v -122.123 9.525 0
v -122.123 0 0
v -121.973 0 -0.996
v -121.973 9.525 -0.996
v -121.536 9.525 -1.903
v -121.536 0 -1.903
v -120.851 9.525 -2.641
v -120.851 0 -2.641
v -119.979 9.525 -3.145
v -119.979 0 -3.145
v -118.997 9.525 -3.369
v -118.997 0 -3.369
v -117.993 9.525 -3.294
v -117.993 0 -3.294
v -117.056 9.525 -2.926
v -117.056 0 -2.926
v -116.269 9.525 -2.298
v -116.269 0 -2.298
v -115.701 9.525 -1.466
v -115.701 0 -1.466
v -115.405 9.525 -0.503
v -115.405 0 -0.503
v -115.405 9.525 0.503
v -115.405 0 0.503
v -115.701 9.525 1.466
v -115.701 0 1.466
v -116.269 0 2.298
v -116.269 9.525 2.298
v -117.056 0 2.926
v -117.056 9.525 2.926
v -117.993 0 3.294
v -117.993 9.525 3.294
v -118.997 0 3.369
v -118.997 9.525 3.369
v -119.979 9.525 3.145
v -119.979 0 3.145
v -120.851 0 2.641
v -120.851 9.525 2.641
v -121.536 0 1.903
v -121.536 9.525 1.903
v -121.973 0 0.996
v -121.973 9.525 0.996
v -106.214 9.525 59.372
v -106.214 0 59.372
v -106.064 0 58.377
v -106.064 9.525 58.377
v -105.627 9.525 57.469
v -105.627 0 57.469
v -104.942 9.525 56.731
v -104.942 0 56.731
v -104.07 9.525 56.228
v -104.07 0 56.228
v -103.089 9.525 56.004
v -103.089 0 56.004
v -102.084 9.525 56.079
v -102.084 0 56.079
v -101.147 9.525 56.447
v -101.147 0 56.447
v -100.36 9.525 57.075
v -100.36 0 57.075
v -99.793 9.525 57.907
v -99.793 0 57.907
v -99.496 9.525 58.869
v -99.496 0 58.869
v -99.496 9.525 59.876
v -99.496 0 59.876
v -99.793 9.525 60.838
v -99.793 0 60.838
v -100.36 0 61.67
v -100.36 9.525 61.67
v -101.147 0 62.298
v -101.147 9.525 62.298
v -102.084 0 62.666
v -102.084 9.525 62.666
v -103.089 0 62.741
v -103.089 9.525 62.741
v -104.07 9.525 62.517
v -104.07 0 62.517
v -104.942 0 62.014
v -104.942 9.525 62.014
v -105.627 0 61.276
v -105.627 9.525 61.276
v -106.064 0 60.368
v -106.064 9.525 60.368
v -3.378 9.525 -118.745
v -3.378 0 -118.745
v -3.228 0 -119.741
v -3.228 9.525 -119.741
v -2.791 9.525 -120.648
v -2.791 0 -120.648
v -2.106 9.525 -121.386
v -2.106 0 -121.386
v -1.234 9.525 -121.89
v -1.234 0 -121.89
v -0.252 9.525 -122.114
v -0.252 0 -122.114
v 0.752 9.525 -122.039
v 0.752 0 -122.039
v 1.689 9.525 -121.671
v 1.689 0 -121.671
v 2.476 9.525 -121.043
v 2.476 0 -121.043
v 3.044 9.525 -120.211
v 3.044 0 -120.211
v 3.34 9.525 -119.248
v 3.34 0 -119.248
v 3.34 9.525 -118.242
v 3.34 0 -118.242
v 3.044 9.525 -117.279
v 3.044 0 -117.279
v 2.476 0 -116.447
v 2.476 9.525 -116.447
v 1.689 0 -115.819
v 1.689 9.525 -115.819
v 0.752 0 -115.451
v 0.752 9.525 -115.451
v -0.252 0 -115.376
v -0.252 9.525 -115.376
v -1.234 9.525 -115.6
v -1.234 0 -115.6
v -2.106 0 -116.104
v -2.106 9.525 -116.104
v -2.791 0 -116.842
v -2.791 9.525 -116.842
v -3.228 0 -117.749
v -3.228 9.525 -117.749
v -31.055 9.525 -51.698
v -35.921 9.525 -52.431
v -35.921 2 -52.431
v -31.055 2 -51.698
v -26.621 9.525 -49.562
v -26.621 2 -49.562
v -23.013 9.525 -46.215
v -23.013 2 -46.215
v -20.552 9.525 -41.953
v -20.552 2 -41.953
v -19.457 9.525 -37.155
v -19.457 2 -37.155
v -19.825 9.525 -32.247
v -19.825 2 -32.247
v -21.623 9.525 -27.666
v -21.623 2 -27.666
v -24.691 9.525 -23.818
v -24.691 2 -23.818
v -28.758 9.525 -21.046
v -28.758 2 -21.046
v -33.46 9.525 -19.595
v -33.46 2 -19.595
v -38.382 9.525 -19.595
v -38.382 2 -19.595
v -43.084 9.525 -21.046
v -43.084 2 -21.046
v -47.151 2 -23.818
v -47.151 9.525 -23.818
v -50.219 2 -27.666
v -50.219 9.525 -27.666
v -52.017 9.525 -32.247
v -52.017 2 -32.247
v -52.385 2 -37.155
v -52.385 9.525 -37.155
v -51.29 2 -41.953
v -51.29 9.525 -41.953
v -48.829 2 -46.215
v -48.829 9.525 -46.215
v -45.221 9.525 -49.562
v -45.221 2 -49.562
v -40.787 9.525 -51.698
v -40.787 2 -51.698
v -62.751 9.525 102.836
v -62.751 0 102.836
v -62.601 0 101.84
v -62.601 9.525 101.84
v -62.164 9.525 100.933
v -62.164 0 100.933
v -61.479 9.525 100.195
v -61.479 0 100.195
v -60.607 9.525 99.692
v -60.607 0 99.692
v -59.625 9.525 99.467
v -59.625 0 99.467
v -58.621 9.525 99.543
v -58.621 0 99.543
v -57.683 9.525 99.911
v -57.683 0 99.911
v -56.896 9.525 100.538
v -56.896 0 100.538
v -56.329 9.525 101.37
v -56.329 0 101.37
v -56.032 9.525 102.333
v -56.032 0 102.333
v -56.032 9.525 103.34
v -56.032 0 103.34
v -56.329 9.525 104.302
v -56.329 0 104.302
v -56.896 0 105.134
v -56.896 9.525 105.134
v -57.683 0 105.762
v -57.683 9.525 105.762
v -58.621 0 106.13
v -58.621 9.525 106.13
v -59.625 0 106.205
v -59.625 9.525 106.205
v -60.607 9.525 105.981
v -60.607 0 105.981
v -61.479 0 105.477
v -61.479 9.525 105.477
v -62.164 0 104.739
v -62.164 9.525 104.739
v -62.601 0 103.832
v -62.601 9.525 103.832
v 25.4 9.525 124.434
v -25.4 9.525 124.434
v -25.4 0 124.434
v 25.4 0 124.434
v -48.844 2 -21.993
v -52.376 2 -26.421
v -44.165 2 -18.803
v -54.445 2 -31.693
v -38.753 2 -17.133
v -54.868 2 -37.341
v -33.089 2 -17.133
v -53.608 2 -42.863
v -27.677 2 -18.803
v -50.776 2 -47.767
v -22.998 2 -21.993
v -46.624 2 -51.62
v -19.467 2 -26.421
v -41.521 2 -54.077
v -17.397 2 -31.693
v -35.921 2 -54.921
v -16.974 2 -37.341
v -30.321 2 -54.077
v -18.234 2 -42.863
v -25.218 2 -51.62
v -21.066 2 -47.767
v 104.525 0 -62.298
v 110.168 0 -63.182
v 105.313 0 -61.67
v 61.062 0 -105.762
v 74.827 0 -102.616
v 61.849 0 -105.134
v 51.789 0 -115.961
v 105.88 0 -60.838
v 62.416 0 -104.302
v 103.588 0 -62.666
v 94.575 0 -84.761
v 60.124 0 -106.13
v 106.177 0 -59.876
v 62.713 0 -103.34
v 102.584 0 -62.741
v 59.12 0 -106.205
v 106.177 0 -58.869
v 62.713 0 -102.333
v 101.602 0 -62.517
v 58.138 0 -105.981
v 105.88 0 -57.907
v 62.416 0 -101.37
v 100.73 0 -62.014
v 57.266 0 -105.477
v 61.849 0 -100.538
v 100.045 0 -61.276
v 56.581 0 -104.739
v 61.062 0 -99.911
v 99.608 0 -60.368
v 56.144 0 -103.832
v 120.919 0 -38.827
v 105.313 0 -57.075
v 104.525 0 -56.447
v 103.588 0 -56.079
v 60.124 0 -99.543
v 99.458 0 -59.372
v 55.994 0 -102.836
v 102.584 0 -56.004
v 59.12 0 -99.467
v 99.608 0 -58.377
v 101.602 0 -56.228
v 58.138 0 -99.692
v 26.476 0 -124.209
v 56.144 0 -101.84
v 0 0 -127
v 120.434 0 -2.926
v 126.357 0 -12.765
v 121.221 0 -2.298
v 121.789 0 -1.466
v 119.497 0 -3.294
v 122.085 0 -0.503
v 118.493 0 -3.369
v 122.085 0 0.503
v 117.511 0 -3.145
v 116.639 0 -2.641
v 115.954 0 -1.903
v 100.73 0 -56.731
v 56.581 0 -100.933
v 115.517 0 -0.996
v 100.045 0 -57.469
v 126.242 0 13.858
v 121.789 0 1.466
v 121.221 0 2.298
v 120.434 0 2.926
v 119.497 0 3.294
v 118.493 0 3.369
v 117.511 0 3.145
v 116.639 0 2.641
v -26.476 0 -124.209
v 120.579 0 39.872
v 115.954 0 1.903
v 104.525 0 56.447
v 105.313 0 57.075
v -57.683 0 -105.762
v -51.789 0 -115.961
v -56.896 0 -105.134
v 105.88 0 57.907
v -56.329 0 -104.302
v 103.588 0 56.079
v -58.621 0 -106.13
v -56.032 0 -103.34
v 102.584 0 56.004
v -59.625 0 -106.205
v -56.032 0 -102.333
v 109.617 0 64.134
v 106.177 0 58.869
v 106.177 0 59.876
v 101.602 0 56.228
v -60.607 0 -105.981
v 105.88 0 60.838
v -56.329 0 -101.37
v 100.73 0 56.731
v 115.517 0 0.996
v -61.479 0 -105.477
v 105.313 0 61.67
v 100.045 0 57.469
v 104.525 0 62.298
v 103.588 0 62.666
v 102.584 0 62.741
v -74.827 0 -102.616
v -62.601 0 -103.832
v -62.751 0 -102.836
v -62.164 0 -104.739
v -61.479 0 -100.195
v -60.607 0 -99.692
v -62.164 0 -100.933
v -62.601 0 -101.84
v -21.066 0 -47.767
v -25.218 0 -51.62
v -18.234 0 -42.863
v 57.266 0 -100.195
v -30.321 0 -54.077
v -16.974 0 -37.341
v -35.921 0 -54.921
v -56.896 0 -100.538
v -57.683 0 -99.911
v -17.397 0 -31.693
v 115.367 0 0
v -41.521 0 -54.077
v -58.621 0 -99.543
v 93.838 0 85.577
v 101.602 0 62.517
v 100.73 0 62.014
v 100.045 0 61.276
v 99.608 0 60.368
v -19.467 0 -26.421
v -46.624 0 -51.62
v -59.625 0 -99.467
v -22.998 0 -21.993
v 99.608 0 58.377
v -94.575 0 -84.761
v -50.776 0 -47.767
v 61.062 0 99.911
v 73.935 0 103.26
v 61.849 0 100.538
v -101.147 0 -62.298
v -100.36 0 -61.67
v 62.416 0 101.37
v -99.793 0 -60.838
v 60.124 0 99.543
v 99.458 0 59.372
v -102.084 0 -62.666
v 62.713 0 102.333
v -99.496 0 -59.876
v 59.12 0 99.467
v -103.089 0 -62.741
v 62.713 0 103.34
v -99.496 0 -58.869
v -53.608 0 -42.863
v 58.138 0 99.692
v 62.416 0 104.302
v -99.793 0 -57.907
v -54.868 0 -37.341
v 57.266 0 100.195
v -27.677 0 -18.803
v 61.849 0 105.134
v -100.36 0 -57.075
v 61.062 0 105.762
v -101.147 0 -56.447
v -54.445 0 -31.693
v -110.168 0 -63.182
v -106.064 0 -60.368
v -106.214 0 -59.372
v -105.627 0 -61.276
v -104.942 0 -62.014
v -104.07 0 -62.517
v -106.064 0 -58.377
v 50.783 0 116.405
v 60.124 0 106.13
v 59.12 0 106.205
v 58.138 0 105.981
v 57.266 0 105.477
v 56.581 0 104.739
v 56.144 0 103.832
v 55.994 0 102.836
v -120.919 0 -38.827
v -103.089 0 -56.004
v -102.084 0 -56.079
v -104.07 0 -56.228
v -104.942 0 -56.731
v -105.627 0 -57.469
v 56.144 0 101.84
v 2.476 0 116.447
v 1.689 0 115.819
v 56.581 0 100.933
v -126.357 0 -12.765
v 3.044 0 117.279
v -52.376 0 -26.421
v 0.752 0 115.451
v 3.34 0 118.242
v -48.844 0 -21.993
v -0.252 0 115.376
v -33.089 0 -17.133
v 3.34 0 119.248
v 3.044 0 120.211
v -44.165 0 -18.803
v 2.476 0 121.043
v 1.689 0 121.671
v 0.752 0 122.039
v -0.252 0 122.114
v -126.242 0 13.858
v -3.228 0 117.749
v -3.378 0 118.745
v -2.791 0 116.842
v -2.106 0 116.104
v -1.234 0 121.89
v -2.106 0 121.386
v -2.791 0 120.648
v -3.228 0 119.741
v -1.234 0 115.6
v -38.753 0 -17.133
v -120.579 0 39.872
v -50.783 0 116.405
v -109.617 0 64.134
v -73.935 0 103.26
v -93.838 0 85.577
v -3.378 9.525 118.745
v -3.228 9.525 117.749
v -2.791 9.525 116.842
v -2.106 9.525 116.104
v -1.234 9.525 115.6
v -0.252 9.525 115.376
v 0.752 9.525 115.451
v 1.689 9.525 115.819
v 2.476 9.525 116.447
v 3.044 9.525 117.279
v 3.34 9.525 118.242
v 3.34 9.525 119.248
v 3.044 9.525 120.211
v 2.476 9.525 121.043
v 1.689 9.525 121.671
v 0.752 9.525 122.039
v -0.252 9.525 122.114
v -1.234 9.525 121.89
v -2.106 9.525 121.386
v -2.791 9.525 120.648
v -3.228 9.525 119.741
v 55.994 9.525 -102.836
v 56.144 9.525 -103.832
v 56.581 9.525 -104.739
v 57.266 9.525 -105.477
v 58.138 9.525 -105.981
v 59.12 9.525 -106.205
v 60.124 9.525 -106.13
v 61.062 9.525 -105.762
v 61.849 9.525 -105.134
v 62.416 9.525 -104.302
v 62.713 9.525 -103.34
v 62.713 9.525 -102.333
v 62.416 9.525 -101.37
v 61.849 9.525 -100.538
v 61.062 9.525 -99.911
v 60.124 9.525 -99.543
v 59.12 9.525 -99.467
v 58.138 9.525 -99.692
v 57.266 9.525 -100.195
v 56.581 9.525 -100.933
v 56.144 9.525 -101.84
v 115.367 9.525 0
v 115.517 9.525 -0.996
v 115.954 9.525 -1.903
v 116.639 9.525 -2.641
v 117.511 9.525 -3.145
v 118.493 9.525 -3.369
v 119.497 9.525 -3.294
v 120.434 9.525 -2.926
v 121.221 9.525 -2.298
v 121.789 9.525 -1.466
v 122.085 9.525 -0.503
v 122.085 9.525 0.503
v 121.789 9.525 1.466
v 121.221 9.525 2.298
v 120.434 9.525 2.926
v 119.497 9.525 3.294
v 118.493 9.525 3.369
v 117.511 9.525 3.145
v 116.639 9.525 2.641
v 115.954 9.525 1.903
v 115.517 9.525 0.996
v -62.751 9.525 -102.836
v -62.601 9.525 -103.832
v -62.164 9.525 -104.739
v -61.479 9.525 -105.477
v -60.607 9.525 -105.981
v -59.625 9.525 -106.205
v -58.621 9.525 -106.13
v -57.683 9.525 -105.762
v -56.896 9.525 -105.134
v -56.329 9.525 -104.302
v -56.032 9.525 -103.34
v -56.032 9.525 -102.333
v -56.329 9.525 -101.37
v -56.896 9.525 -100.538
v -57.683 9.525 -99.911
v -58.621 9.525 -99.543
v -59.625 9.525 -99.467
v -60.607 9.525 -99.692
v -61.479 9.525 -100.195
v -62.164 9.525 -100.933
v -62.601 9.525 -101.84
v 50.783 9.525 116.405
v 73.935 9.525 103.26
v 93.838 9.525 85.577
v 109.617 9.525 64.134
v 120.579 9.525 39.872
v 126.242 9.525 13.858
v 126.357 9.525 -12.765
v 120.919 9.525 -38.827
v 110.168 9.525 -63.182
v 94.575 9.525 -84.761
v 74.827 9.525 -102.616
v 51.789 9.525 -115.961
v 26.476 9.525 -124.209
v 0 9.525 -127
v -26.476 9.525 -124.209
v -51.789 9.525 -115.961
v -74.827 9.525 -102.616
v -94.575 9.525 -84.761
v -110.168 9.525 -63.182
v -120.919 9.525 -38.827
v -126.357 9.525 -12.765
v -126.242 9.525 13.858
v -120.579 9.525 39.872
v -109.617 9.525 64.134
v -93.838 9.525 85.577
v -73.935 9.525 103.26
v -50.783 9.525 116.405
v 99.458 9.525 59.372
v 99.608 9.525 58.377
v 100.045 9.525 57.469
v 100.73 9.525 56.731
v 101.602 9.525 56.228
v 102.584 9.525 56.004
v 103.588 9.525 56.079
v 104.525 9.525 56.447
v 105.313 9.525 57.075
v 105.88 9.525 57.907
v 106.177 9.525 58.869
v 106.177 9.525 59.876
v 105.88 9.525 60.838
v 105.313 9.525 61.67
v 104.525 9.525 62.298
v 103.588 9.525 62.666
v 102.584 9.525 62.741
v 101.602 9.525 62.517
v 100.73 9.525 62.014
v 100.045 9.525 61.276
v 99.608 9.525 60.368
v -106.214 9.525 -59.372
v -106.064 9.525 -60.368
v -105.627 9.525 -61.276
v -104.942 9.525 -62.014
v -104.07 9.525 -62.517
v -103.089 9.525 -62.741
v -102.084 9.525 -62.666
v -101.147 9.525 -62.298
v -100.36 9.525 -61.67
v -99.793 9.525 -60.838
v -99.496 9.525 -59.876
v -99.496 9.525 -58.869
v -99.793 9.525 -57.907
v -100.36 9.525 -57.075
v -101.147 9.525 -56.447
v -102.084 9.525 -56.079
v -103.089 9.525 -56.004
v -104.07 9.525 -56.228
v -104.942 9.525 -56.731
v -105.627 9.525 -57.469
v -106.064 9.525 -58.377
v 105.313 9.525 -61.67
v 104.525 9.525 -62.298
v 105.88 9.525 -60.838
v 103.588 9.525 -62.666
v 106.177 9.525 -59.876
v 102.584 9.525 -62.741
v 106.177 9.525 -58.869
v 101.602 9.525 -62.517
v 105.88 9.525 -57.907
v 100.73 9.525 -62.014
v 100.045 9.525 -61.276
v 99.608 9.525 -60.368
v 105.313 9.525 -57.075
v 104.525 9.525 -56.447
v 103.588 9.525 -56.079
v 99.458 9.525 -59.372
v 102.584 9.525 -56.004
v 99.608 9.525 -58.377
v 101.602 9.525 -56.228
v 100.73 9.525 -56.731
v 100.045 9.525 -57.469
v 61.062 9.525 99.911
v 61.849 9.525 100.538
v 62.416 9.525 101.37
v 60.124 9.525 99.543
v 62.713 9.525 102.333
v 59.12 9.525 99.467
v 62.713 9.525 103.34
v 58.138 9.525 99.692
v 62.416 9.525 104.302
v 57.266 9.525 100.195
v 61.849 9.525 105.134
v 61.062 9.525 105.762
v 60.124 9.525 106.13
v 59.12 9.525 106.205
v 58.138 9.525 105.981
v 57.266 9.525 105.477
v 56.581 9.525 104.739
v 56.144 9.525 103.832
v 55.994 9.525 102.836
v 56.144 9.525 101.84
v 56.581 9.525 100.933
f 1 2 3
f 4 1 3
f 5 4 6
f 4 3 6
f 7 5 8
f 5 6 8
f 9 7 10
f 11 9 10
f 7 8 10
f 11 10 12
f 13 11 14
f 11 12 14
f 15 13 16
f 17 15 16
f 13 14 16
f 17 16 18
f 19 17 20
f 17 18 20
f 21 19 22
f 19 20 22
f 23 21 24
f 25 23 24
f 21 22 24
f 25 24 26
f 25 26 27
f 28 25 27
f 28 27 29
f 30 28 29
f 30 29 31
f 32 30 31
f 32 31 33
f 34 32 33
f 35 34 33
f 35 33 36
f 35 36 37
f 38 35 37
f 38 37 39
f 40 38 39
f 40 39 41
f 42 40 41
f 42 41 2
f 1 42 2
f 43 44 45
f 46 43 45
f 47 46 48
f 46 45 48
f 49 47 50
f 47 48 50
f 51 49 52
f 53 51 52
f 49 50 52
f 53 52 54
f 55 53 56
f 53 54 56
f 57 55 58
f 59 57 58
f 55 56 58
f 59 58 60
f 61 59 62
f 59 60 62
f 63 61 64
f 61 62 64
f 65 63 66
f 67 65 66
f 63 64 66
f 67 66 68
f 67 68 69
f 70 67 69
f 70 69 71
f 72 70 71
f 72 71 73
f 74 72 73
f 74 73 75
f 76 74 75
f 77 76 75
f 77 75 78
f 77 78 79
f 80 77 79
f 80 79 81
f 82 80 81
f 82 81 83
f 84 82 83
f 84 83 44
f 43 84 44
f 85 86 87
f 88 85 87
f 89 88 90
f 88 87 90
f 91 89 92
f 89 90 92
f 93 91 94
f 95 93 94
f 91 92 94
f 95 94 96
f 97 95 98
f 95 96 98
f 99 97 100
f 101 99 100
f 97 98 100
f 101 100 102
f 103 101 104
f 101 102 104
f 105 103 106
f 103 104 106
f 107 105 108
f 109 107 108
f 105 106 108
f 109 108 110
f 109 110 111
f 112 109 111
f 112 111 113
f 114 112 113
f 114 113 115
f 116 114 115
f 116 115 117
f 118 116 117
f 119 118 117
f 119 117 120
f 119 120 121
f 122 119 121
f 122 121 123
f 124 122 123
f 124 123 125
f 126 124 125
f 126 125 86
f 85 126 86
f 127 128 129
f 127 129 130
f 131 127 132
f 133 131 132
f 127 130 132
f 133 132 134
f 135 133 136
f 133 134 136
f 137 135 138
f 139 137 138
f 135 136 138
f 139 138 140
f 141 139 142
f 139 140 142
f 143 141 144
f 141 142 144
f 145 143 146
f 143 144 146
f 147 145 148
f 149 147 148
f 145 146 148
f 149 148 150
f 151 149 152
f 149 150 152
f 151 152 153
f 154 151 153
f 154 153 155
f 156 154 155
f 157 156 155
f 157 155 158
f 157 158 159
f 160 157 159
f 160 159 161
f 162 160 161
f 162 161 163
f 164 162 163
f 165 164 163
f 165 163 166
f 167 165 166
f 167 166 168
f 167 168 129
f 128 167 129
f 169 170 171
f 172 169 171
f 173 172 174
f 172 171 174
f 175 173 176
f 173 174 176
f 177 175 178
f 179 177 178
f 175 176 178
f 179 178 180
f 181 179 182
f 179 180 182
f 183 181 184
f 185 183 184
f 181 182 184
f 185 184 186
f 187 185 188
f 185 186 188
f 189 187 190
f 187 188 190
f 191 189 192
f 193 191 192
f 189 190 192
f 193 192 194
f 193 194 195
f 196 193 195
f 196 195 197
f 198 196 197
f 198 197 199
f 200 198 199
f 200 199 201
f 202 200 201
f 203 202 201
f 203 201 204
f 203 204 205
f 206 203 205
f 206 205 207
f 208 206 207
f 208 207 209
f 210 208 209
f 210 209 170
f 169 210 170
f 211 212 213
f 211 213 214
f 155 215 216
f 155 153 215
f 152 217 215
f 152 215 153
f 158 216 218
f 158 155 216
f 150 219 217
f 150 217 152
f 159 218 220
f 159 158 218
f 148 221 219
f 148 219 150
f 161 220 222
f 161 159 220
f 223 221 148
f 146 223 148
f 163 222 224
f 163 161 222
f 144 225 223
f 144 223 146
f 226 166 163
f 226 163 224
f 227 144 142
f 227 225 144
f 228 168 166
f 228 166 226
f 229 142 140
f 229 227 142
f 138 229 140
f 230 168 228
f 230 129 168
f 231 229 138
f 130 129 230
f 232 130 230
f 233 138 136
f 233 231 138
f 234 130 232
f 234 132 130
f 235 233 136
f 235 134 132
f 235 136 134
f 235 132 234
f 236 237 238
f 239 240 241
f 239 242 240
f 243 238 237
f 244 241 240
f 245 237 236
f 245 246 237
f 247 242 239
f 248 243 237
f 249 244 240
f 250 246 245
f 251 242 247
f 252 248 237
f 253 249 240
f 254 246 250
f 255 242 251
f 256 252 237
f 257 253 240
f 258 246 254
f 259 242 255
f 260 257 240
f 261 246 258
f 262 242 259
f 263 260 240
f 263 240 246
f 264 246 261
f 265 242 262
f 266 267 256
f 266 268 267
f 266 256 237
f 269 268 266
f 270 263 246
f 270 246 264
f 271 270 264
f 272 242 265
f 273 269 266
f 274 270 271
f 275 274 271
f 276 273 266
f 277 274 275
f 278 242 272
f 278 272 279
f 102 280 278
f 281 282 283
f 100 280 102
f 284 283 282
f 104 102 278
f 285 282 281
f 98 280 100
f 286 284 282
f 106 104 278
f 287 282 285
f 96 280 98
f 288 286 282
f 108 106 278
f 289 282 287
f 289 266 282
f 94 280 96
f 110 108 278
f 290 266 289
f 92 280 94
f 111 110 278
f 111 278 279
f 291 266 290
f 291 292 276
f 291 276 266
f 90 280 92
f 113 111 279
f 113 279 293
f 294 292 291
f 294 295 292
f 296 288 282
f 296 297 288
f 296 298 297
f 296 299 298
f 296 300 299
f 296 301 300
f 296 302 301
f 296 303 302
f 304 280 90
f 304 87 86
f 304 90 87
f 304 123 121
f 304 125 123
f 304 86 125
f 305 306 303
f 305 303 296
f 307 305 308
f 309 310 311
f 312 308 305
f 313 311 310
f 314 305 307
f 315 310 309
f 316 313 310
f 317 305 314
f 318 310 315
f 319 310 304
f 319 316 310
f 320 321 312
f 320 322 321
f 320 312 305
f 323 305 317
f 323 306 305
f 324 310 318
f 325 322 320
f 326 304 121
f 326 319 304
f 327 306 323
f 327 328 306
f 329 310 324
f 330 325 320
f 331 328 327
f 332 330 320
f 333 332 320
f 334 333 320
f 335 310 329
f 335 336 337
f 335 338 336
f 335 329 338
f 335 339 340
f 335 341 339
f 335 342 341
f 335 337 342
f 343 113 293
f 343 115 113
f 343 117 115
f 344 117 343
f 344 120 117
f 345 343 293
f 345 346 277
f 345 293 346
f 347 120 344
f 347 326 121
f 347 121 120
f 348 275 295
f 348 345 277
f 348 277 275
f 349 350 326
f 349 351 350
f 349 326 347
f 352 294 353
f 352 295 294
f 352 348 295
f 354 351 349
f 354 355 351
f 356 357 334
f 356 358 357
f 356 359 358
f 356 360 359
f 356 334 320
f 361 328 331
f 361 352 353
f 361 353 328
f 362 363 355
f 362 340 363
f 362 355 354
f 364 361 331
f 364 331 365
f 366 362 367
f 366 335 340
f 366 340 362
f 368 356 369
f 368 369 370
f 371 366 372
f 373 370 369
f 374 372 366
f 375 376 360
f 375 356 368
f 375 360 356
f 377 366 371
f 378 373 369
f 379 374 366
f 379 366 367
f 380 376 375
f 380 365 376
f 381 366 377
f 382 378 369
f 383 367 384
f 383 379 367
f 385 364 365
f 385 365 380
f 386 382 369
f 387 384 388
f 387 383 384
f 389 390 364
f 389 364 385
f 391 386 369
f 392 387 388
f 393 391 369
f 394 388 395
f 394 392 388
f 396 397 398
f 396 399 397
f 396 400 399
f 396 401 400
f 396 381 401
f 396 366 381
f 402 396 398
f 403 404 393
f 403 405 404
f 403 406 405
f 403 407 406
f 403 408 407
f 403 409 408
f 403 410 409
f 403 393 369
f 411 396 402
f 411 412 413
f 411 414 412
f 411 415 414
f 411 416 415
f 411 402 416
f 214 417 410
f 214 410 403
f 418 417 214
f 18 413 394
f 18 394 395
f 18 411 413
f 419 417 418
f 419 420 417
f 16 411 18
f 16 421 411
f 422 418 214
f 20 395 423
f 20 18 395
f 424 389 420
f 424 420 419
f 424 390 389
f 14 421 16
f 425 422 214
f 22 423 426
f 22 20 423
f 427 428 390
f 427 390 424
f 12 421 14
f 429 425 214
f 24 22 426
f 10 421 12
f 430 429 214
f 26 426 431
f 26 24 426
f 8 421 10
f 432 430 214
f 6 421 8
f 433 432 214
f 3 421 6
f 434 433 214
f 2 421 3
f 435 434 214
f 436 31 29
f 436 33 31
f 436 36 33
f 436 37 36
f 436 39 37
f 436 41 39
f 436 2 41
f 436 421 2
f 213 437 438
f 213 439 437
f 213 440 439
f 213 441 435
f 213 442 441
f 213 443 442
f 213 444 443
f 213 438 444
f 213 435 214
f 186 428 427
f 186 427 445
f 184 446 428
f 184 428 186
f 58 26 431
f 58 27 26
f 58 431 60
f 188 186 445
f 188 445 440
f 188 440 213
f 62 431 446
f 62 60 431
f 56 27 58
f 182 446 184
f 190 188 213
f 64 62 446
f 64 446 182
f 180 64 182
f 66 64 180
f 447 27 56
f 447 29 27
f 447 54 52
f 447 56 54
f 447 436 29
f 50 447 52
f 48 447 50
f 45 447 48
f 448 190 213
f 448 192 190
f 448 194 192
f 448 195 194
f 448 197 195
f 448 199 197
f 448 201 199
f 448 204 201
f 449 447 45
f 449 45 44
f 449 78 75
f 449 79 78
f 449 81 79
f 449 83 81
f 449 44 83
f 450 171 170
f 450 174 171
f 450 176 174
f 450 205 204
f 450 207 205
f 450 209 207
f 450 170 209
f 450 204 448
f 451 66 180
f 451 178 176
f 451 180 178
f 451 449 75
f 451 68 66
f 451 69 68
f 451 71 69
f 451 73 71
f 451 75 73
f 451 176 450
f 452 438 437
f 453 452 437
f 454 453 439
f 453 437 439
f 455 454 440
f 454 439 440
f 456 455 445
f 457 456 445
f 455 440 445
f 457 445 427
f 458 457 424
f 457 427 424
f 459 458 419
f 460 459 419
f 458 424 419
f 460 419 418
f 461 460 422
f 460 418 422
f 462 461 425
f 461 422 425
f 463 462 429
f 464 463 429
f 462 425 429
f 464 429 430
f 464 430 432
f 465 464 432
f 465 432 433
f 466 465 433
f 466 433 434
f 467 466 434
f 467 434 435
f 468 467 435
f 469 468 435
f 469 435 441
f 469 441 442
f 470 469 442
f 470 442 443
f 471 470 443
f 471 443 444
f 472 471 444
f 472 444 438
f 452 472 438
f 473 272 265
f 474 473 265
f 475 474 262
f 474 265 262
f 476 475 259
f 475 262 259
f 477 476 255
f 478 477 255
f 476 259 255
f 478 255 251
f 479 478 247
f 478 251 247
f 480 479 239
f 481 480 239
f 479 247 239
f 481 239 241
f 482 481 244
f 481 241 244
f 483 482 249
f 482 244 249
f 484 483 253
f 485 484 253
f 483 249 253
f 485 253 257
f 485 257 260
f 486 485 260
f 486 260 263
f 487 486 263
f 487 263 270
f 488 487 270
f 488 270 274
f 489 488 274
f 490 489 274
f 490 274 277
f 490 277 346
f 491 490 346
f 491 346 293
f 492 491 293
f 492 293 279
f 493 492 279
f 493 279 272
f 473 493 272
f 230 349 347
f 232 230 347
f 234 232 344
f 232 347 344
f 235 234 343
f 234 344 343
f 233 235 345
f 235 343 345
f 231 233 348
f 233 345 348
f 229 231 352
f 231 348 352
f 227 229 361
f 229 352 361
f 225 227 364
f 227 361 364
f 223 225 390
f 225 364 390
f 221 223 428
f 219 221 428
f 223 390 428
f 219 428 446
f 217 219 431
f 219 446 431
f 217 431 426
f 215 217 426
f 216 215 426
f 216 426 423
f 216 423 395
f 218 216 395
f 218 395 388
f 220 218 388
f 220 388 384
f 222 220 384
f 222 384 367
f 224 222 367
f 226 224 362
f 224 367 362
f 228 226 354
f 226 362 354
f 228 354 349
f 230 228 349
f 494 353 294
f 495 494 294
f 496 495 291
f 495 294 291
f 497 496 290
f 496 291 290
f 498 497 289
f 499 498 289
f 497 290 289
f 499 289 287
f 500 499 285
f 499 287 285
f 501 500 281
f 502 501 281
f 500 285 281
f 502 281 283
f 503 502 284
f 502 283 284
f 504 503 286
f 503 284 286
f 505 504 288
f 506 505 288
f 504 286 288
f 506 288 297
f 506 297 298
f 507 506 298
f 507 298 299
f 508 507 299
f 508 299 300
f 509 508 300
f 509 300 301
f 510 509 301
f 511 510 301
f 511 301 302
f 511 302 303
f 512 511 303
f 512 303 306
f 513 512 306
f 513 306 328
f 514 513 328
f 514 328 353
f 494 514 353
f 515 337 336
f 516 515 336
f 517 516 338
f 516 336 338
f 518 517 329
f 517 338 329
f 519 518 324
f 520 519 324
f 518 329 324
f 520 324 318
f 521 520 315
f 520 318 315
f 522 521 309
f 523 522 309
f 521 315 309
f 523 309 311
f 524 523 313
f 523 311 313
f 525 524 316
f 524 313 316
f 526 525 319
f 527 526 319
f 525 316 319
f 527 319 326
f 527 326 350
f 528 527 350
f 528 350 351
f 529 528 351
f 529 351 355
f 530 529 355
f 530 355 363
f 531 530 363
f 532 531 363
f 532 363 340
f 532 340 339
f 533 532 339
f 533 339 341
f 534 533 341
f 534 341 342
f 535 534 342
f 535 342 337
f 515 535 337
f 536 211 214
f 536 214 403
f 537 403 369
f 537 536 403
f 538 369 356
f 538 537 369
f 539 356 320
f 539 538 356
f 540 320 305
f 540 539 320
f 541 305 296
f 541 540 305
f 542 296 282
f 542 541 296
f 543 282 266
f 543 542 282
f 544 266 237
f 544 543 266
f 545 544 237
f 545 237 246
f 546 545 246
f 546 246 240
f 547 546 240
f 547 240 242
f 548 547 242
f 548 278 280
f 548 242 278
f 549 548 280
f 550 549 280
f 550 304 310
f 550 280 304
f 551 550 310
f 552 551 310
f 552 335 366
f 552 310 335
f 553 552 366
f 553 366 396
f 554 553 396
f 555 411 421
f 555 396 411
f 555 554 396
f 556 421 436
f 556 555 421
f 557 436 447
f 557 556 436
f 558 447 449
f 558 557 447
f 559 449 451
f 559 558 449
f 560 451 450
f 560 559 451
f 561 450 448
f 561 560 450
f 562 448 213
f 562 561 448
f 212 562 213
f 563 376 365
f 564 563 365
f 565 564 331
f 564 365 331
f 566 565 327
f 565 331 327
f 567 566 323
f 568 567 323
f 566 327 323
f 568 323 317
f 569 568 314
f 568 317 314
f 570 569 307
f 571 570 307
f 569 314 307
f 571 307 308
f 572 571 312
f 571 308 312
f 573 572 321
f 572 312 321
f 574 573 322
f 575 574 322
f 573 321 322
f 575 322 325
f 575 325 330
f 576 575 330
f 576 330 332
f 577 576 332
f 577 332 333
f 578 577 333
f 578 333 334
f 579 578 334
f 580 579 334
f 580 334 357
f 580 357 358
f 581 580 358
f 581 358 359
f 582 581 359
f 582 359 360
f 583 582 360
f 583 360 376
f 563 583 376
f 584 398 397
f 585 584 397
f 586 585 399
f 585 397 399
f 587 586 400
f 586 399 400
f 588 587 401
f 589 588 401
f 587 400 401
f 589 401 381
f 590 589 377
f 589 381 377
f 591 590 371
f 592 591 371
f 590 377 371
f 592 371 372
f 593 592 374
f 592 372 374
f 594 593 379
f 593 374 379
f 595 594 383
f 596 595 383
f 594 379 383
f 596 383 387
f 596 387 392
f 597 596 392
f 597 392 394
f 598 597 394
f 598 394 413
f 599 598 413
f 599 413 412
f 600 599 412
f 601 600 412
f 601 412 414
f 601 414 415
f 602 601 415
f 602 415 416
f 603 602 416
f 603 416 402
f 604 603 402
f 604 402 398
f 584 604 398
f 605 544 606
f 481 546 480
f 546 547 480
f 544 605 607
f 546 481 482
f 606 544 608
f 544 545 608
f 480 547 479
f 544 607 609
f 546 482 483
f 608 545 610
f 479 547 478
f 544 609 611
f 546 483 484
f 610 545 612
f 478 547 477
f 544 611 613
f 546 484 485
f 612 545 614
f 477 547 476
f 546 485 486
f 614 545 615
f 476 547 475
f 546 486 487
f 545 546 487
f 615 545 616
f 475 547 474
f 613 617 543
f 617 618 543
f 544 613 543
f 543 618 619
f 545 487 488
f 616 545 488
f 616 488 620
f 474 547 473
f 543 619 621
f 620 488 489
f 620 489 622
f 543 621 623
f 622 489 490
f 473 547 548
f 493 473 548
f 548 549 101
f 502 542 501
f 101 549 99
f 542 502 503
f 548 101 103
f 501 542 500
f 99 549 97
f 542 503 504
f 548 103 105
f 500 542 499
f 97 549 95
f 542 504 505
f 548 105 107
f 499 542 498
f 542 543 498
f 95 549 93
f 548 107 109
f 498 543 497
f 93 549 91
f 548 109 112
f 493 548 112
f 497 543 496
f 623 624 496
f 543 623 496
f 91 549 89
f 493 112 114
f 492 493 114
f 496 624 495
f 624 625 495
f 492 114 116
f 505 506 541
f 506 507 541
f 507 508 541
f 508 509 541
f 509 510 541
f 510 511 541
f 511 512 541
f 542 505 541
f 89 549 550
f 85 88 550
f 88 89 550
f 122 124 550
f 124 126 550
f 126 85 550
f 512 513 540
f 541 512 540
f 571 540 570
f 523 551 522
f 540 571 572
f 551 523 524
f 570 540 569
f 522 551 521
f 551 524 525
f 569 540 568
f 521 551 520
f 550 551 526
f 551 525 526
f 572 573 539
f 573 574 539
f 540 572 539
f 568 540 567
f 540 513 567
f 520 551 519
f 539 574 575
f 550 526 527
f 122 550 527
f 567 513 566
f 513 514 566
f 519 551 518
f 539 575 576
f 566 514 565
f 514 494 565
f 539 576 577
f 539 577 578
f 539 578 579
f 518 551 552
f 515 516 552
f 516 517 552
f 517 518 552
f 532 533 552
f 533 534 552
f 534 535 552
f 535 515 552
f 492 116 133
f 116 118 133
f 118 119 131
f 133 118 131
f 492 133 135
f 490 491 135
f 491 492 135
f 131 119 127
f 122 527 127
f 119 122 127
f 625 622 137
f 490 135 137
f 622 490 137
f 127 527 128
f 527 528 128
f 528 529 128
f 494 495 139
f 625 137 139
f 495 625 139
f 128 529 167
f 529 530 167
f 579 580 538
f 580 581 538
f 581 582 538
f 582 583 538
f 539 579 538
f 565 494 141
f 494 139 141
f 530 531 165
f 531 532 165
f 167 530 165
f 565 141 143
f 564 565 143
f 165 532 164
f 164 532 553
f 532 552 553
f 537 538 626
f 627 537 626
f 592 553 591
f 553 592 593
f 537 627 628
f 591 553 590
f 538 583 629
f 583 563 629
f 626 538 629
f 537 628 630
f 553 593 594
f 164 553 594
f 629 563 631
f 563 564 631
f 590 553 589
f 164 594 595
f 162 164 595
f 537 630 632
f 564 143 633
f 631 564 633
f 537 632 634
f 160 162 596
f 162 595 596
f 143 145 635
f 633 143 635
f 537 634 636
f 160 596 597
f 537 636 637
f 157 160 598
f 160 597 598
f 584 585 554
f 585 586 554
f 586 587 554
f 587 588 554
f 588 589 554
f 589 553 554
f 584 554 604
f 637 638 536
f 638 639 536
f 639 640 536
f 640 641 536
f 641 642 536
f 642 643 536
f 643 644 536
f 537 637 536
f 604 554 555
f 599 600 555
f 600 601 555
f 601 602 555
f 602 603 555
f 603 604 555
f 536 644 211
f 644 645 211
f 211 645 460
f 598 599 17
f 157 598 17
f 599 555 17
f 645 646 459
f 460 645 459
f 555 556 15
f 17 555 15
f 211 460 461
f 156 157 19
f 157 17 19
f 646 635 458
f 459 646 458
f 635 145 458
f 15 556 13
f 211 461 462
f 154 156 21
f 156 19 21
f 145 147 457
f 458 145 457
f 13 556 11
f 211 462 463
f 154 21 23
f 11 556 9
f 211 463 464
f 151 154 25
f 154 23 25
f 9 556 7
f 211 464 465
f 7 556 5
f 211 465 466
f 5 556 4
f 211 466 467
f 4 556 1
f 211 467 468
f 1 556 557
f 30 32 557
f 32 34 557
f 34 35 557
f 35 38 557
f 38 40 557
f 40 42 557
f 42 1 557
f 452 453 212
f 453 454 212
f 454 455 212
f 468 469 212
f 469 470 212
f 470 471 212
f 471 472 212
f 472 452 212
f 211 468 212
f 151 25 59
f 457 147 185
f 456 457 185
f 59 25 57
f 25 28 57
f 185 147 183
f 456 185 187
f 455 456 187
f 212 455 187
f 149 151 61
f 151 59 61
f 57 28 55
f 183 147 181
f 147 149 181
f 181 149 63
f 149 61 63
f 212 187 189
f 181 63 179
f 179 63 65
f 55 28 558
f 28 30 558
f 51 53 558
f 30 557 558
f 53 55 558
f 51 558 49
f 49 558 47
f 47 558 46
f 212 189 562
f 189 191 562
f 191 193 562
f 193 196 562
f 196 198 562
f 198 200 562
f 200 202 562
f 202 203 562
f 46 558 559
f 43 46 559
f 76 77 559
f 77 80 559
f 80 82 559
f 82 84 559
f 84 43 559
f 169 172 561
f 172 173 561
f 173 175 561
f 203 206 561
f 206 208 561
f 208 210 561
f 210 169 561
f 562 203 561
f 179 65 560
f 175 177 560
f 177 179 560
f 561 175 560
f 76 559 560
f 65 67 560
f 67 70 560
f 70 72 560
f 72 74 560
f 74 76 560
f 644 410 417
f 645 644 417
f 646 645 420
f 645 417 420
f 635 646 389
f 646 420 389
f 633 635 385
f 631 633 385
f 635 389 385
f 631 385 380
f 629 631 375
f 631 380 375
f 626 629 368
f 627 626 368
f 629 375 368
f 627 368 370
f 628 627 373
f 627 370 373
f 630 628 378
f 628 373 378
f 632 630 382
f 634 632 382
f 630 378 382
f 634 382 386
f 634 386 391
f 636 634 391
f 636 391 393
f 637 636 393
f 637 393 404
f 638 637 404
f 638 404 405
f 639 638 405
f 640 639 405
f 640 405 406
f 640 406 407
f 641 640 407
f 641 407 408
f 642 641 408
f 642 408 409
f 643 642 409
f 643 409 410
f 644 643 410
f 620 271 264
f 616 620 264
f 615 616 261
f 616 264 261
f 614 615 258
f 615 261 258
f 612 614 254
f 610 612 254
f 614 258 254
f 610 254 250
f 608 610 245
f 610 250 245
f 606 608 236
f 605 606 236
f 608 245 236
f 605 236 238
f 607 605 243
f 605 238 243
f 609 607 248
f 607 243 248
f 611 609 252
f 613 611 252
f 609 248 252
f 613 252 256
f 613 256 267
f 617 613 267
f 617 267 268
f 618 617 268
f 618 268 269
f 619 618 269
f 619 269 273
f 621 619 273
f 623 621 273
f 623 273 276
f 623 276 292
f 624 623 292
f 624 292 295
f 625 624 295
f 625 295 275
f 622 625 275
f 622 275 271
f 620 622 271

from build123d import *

# Parameters (mm, degrees)
SKETCH1_W               = 127
SKETCH1_H               = 9.525
F_1_4_CLEARANCE_HOLE1_D = 6.7564
CUT_EXTRUDE1_REACH      = 181.858
SKETCH4_W               = 50.8
SKETCH4_H               = 2.565921067
CUT_EXTRUDE2_REACH      = 181.858
SKETCH6_R               = 16.51
SKETCH7_R               = 19
CUT_EXTRUDE3_DEPTH      = 2


with BuildPart() as part:
    # Sketch1 → Revolve1 (revolve)
    with BuildSketch(Plane.XY, mode=Mode.PRIVATE) as revolve1_sk:
        with Locations((63.5, 4.7625)):
            Rectangle(SKETCH1_W, SKETCH1_H)
    revolve(revolve1_sk.sketch.rotate(Axis((0, 0, 0), (0, 1, 0)), 90), axis=Axis((0, 0, 0), (0, 1, 0)))

    # 1/4 Clearance Hole1 (through all)
    with Locations(Plane(origin=(0, 9.525, 0), x_dir=(1, 0, 0), z_dir=(0, 1, 0))):
        with Locations((0, 118.745), (59.3725, 102.836186572), (102.836186572, 59.3725), (118.745, 0), (102.836186572, -59.3725), (59.3725, -102.836186572), (0, -118.745), (-59.3725, -102.836186572), (-102.836186572, -59.3725), (-118.745, 0), (-102.836186572, 59.3725), (-59.3725, 102.836186572)):
            Hole(F_1_4_CLEARANCE_HOLE1_D / 2)

    # Sketch4 → Cut-Extrude1 (cut, up to next)
    with BuildSketch(Plane(origin=(0, 9.525, 0), x_dir=(1, 0, 0), z_dir=(0, 1, 0)), mode=Mode.PRIVATE) as cut_extrude1_sk1:
        with Locations((0, -125.717039467)):
            Rectangle(SKETCH4_W, SKETCH4_H)
    cut_extrude1_tool1 = extrude(cut_extrude1_sk1.sketch, amount=-CUT_EXTRUDE1_REACH, mode=Mode.PRIVATE) & part.part
    add(cut_extrude1_tool1.solids().sort_by_distance((0, 9.525, 125.717039))[0], mode=Mode.SUBTRACT)

    # Sketch6 → Cut-Extrude2 (cut, up to next)
    with BuildSketch(Plane.XZ, mode=Mode.PRIVATE) as cut_extrude2_sk1:
        with Locations(Location((-35.921024484, -35.921024484, 0), (0, 0, 270))):
            Circle(SKETCH6_R)
    cut_extrude2_tool1 = extrude(cut_extrude2_sk1.sketch, amount=-CUT_EXTRUDE2_REACH, mode=Mode.PRIVATE) & part.part
    add(cut_extrude2_tool1.solids().sort_by_distance((-35.921024, 0, -35.921024))[0], mode=Mode.SUBTRACT)

    # Sketch7 → Cut-Extrude3 (cut)
    with BuildSketch(Plane.XZ):
        with Locations(Location((-35.921024484, -35.921024484, 0), (0, 0, 270))):
            Circle(SKETCH7_R)
    extrude(amount=-CUT_EXTRUDE3_DEPTH, mode=Mode.SUBTRACT)


solid = part.part
